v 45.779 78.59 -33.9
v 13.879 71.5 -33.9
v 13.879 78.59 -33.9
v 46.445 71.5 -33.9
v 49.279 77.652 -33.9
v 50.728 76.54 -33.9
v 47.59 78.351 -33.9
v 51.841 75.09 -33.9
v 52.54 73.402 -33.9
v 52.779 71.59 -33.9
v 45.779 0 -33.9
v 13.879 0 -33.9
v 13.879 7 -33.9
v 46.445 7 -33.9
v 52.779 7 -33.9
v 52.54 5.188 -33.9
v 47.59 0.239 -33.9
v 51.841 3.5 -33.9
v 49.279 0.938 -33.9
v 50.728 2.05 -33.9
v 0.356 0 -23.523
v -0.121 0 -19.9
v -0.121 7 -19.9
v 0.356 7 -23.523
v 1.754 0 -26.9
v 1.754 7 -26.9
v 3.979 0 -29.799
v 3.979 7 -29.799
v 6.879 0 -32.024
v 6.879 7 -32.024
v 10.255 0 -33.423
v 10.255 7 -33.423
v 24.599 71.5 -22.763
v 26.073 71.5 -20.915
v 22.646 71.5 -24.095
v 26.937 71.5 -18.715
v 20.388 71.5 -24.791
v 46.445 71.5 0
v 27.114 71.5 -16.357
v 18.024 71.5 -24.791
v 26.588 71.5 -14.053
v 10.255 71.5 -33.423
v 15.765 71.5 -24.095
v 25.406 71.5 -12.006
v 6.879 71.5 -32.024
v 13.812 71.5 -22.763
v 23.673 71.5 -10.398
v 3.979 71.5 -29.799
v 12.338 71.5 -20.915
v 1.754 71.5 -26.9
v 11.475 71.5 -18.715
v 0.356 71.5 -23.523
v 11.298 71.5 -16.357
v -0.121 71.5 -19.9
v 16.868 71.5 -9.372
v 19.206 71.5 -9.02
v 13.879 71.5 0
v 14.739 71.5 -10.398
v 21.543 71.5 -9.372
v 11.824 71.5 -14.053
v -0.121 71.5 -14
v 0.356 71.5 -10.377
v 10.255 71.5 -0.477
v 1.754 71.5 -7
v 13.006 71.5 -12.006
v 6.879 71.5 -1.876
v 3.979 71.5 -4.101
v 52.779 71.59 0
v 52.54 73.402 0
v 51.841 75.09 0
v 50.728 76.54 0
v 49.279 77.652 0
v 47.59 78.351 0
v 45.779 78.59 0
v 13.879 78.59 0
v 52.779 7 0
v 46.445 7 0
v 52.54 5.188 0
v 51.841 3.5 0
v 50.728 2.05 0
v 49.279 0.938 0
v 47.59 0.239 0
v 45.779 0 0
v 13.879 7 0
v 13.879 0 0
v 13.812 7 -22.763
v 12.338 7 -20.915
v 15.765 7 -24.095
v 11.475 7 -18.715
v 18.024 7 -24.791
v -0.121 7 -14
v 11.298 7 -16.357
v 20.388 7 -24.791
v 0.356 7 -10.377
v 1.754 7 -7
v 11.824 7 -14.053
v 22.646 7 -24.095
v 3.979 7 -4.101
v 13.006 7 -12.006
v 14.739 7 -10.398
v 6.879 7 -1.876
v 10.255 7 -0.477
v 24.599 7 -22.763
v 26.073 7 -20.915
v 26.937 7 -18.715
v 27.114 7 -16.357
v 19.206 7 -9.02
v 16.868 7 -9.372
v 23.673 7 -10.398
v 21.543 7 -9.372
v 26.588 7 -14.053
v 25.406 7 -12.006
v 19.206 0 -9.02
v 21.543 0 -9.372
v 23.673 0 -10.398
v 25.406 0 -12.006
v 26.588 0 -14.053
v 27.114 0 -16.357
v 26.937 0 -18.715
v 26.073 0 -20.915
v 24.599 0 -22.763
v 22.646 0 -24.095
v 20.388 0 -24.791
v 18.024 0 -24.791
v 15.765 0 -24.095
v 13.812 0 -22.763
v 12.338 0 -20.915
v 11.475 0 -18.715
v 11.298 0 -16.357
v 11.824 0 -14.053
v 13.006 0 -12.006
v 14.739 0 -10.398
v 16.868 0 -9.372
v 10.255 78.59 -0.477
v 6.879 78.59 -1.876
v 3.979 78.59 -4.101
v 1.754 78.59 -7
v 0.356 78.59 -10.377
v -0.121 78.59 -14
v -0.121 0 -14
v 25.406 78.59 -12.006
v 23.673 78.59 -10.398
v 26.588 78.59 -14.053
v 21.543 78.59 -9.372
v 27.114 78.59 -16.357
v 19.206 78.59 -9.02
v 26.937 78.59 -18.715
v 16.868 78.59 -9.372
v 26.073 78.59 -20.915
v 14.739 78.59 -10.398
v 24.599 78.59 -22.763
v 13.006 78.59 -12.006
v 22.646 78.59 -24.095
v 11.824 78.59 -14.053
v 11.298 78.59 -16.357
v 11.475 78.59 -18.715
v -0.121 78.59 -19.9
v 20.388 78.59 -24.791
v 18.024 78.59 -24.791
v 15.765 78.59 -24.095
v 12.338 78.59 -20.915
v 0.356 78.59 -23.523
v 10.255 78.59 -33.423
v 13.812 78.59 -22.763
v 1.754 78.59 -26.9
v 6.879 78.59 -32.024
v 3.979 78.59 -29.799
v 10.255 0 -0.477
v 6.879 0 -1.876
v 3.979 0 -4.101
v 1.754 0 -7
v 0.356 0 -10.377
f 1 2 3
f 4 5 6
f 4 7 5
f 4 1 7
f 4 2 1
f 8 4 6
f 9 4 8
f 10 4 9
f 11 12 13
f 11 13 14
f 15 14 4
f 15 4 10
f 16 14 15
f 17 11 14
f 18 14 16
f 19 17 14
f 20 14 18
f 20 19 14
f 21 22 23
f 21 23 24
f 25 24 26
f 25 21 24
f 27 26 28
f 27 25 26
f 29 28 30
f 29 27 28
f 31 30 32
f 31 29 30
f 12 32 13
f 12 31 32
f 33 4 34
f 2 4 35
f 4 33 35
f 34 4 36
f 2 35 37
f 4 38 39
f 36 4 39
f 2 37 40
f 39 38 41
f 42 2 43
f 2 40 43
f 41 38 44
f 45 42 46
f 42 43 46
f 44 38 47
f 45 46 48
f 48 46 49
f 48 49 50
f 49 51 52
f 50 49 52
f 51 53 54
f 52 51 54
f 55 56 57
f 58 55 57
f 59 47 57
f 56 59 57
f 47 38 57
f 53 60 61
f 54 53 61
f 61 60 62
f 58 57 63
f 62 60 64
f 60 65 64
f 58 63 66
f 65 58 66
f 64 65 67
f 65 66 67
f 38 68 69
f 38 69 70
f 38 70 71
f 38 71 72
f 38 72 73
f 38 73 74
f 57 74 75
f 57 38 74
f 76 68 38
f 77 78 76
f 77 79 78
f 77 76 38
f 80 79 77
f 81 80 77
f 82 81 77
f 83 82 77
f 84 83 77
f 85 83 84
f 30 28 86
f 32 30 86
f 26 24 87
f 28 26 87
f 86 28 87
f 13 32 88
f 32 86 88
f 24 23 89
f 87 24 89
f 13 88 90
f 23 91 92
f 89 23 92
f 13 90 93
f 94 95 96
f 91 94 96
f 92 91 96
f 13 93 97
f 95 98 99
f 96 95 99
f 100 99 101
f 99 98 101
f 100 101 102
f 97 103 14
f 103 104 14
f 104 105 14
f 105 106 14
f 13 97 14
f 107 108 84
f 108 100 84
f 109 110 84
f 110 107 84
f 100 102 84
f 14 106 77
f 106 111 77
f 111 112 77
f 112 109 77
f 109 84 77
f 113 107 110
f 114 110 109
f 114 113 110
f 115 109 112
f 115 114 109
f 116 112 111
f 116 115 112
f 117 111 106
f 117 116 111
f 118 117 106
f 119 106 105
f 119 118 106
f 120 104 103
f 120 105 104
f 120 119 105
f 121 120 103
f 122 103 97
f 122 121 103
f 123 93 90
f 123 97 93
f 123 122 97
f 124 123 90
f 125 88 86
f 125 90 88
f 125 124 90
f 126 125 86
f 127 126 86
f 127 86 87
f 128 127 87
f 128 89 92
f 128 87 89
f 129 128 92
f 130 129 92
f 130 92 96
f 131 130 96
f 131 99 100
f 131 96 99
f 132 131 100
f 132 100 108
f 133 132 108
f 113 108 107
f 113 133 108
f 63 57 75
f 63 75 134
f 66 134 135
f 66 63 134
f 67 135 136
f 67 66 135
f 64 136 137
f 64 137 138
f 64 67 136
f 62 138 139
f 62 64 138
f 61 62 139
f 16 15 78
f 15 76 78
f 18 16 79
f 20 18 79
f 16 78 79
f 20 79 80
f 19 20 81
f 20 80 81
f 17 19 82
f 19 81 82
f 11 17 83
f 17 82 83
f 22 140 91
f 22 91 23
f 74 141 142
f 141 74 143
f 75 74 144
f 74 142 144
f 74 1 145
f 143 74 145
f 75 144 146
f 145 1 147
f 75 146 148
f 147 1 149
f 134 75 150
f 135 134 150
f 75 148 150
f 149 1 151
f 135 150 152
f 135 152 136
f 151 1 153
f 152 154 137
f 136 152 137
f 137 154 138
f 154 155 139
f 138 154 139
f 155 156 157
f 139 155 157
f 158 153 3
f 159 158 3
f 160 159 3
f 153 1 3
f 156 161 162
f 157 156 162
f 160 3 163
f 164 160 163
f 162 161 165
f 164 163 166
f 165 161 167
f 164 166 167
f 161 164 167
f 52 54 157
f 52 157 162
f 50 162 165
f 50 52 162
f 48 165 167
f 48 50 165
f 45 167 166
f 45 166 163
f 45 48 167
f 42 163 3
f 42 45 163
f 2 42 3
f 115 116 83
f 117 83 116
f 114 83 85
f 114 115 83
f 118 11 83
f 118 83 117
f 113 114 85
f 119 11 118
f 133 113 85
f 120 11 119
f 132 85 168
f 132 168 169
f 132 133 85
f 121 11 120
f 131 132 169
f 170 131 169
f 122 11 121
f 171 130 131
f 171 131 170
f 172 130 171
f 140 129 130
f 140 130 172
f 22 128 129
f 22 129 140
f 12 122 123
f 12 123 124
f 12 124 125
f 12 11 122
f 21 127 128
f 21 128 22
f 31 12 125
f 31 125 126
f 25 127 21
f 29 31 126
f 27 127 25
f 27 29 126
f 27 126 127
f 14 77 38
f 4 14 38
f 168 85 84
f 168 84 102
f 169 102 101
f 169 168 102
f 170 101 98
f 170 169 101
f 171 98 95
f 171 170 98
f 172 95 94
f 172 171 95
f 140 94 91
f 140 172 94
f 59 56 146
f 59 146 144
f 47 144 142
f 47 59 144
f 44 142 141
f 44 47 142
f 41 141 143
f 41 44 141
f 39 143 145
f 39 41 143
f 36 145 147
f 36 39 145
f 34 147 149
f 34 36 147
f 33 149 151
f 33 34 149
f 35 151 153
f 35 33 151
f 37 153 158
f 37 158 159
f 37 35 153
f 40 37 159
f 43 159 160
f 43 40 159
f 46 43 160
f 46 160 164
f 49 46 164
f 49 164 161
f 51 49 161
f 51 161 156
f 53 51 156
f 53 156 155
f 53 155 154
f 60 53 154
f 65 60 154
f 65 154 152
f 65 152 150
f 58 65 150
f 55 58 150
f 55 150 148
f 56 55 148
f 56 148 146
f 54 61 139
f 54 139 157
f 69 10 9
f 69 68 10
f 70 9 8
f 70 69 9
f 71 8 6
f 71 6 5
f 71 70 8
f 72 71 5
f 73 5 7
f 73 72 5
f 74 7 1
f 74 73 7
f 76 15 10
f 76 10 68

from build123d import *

# Parameters (mm, degrees)
SKETCH2_R           = 7.93
BOSS_EXTRUDE1_DEPTH = 78.59
FILLET1_R           = 7
CUT_EXTRUDE1_DEPTH  = 86.59
FILLET2_R           = 7


with BuildPart() as part:
    # Sketch2 → Boss-Extrude1 (new body)
    with BuildSketch(Plane(origin=(0, 0, 0), x_dir=(1, 0, 0), z_dir=(0, 1, 0))):
        with BuildLine():
            Line((-0.121305042, 14), (-0.121305042, 19.9))
            ThreePointArc((-0.121305042, 19.9), (3.979200021, 29.799494937), (13.878694958, 33.9))
            Line((13.878694958, 33.9), (52.778694958, 33.9))
            Line((52.778694958, 33.9), (52.778694958, 0))
            Line((52.778694958, 0), (13.878694958, 0))
            ThreePointArc((13.878694958, 0), (3.979200021, 4.100505063), (-0.121305042, 14))
        make_face()
        with Locations(Location((19.205687065, 16.95, 0), (0, 0, 270))):
            Circle(SKETCH2_R, mode=Mode.SUBTRACT)
    extrude(amount=BOSS_EXTRUDE1_DEPTH)

    # Fillet1
    fillet1_edges = [part.edges().sort_by_distance(p)[0] for p in [
        (52.778694958, 78.59, -16.95),
    ]]
    fillet(fillet1_edges, radius=FILLET1_R)

    # Sketch8 → Cut-Extrude1 (cut)
    with BuildSketch(Plane.XY):
        Polygon((46.445498075, 69.59), (46.445498075, 7), (13.878694958, 7), (-13.306366157, 7), (-13.306366157, 69.59), (-13.306366157, 71.500154521), (13.878694958, 71.500154521), (46.445498075, 71.500154521), align=None)
    extrude(amount=-CUT_EXTRUDE1_DEPTH, mode=Mode.SUBTRACT)

    # Fillet2
    fillet2_edges = [part.edges().sort_by_distance(p)[0] for p in [
        (52.778694958, 0, -16.95),
    ]]
    fillet(fillet2_edges, radius=FILLET2_R)


solid = part.part
